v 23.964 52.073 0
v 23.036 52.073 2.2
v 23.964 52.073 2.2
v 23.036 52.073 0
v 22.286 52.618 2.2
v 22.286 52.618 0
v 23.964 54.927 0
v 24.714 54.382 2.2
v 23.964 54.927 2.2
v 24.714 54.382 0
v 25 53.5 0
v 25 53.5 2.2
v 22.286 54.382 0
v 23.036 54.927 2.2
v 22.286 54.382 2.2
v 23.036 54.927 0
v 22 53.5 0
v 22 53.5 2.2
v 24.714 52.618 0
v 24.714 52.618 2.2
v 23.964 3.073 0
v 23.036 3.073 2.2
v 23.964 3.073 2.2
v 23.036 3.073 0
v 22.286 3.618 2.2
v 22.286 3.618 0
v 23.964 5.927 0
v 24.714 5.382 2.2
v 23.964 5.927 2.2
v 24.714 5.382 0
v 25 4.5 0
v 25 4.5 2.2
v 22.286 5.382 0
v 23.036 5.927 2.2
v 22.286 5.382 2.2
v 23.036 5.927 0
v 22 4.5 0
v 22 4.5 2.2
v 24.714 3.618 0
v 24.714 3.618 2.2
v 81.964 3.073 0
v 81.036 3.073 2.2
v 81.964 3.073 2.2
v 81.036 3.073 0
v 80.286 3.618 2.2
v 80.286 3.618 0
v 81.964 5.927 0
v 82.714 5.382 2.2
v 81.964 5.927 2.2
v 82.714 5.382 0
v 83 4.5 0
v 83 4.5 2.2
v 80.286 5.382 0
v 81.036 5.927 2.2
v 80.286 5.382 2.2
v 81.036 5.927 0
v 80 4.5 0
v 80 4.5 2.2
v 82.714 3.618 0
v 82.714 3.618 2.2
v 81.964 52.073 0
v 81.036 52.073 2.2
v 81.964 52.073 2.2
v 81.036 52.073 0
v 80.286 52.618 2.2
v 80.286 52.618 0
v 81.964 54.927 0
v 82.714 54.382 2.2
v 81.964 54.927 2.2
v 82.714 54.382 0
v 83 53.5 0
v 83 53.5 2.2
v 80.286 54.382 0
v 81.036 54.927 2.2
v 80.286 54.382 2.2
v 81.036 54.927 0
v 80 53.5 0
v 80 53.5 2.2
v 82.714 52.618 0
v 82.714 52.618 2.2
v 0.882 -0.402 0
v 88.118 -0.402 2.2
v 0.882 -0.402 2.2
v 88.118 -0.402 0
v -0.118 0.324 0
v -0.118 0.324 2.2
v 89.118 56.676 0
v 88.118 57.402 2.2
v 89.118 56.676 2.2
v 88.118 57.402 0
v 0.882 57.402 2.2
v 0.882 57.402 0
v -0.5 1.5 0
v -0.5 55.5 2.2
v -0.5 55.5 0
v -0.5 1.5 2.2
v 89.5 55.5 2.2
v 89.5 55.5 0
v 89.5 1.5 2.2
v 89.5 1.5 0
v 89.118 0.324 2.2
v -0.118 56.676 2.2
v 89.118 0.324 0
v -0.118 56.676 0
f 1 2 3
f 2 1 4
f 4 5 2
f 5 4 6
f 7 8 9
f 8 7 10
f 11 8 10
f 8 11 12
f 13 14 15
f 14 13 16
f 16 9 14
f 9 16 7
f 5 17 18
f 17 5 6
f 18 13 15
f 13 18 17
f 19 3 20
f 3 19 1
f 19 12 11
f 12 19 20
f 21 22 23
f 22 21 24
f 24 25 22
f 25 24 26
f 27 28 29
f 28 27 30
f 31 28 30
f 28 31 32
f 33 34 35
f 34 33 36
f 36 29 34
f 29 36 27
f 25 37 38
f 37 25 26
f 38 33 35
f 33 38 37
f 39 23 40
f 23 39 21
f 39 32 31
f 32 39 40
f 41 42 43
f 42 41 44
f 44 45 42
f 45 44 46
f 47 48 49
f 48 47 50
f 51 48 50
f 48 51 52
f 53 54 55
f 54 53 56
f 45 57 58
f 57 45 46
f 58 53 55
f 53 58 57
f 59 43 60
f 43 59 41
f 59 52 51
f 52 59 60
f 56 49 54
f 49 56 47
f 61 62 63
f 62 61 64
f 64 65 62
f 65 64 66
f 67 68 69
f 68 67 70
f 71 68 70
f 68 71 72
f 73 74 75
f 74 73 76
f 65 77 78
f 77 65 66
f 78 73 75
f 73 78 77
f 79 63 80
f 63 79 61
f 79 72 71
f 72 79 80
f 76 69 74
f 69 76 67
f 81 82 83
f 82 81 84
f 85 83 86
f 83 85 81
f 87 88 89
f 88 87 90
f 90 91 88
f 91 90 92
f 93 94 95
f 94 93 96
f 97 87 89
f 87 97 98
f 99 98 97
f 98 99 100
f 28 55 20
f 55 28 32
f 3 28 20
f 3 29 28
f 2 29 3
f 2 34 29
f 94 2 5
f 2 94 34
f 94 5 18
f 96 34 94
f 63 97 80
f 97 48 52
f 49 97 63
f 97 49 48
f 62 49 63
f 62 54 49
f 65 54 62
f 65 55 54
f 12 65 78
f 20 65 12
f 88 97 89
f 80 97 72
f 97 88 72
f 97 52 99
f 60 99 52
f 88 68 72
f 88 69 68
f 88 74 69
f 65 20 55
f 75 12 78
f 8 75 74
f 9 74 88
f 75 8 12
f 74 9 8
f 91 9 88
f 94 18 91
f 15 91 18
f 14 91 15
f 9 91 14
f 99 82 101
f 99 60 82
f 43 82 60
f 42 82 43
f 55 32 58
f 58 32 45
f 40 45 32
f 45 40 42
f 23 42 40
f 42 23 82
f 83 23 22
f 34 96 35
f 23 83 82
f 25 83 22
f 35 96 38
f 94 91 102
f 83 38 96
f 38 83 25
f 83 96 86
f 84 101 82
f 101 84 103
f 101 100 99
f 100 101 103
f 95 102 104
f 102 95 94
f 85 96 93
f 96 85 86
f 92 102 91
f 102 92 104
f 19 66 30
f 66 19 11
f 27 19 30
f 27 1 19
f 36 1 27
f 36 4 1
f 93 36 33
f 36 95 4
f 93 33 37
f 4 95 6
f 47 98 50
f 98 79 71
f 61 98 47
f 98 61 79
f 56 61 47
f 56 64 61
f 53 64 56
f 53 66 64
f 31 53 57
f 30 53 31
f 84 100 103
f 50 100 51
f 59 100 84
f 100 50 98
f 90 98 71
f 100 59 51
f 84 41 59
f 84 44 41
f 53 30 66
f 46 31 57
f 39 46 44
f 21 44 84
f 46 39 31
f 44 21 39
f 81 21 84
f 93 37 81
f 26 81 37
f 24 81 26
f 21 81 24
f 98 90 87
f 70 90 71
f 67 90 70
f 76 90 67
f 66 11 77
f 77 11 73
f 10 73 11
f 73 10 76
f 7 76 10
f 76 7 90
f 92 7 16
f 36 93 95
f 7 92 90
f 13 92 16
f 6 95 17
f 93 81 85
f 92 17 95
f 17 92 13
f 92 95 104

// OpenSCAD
$fn=10;
epsilon = 0.5;

module round_cube(length, width, height, dimeter) {
    r = dimeter / 2.0;
    hull() {
        translate([r, r, 0]) cylinder(height, r, r);
        translate([length-r, r, 0]) cylinder(height, r, r);
        translate([r, width-r, 0]) cylinder(height, r, r);
        translate([length-r, width-r, 0]) cylinder(height, r, r);
    }
}


module pcb_board() {
    translate([-epsilon, -epsilon, 0])
    round_cube(89 + epsilon*2, 57+epsilon*2, 1.7+epsilon, 4.0);    
}

module mounting_holes() {
    translate([23.5, 53.5, 0]) cylinder(10, 3/2, 3/2, true);
    translate([23.5, 4.5, 0]) cylinder(10, 3/2, 3/2, true);
    translate([81.5, 4.5, 0]) cylinder(10, 3/2, 3/2, true);
    translate([81.5, 53.5, 0]) cylinder(10, 3/2, 3/2, true);
}

difference() {
    pcb_board();
    mounting_holes();
}
